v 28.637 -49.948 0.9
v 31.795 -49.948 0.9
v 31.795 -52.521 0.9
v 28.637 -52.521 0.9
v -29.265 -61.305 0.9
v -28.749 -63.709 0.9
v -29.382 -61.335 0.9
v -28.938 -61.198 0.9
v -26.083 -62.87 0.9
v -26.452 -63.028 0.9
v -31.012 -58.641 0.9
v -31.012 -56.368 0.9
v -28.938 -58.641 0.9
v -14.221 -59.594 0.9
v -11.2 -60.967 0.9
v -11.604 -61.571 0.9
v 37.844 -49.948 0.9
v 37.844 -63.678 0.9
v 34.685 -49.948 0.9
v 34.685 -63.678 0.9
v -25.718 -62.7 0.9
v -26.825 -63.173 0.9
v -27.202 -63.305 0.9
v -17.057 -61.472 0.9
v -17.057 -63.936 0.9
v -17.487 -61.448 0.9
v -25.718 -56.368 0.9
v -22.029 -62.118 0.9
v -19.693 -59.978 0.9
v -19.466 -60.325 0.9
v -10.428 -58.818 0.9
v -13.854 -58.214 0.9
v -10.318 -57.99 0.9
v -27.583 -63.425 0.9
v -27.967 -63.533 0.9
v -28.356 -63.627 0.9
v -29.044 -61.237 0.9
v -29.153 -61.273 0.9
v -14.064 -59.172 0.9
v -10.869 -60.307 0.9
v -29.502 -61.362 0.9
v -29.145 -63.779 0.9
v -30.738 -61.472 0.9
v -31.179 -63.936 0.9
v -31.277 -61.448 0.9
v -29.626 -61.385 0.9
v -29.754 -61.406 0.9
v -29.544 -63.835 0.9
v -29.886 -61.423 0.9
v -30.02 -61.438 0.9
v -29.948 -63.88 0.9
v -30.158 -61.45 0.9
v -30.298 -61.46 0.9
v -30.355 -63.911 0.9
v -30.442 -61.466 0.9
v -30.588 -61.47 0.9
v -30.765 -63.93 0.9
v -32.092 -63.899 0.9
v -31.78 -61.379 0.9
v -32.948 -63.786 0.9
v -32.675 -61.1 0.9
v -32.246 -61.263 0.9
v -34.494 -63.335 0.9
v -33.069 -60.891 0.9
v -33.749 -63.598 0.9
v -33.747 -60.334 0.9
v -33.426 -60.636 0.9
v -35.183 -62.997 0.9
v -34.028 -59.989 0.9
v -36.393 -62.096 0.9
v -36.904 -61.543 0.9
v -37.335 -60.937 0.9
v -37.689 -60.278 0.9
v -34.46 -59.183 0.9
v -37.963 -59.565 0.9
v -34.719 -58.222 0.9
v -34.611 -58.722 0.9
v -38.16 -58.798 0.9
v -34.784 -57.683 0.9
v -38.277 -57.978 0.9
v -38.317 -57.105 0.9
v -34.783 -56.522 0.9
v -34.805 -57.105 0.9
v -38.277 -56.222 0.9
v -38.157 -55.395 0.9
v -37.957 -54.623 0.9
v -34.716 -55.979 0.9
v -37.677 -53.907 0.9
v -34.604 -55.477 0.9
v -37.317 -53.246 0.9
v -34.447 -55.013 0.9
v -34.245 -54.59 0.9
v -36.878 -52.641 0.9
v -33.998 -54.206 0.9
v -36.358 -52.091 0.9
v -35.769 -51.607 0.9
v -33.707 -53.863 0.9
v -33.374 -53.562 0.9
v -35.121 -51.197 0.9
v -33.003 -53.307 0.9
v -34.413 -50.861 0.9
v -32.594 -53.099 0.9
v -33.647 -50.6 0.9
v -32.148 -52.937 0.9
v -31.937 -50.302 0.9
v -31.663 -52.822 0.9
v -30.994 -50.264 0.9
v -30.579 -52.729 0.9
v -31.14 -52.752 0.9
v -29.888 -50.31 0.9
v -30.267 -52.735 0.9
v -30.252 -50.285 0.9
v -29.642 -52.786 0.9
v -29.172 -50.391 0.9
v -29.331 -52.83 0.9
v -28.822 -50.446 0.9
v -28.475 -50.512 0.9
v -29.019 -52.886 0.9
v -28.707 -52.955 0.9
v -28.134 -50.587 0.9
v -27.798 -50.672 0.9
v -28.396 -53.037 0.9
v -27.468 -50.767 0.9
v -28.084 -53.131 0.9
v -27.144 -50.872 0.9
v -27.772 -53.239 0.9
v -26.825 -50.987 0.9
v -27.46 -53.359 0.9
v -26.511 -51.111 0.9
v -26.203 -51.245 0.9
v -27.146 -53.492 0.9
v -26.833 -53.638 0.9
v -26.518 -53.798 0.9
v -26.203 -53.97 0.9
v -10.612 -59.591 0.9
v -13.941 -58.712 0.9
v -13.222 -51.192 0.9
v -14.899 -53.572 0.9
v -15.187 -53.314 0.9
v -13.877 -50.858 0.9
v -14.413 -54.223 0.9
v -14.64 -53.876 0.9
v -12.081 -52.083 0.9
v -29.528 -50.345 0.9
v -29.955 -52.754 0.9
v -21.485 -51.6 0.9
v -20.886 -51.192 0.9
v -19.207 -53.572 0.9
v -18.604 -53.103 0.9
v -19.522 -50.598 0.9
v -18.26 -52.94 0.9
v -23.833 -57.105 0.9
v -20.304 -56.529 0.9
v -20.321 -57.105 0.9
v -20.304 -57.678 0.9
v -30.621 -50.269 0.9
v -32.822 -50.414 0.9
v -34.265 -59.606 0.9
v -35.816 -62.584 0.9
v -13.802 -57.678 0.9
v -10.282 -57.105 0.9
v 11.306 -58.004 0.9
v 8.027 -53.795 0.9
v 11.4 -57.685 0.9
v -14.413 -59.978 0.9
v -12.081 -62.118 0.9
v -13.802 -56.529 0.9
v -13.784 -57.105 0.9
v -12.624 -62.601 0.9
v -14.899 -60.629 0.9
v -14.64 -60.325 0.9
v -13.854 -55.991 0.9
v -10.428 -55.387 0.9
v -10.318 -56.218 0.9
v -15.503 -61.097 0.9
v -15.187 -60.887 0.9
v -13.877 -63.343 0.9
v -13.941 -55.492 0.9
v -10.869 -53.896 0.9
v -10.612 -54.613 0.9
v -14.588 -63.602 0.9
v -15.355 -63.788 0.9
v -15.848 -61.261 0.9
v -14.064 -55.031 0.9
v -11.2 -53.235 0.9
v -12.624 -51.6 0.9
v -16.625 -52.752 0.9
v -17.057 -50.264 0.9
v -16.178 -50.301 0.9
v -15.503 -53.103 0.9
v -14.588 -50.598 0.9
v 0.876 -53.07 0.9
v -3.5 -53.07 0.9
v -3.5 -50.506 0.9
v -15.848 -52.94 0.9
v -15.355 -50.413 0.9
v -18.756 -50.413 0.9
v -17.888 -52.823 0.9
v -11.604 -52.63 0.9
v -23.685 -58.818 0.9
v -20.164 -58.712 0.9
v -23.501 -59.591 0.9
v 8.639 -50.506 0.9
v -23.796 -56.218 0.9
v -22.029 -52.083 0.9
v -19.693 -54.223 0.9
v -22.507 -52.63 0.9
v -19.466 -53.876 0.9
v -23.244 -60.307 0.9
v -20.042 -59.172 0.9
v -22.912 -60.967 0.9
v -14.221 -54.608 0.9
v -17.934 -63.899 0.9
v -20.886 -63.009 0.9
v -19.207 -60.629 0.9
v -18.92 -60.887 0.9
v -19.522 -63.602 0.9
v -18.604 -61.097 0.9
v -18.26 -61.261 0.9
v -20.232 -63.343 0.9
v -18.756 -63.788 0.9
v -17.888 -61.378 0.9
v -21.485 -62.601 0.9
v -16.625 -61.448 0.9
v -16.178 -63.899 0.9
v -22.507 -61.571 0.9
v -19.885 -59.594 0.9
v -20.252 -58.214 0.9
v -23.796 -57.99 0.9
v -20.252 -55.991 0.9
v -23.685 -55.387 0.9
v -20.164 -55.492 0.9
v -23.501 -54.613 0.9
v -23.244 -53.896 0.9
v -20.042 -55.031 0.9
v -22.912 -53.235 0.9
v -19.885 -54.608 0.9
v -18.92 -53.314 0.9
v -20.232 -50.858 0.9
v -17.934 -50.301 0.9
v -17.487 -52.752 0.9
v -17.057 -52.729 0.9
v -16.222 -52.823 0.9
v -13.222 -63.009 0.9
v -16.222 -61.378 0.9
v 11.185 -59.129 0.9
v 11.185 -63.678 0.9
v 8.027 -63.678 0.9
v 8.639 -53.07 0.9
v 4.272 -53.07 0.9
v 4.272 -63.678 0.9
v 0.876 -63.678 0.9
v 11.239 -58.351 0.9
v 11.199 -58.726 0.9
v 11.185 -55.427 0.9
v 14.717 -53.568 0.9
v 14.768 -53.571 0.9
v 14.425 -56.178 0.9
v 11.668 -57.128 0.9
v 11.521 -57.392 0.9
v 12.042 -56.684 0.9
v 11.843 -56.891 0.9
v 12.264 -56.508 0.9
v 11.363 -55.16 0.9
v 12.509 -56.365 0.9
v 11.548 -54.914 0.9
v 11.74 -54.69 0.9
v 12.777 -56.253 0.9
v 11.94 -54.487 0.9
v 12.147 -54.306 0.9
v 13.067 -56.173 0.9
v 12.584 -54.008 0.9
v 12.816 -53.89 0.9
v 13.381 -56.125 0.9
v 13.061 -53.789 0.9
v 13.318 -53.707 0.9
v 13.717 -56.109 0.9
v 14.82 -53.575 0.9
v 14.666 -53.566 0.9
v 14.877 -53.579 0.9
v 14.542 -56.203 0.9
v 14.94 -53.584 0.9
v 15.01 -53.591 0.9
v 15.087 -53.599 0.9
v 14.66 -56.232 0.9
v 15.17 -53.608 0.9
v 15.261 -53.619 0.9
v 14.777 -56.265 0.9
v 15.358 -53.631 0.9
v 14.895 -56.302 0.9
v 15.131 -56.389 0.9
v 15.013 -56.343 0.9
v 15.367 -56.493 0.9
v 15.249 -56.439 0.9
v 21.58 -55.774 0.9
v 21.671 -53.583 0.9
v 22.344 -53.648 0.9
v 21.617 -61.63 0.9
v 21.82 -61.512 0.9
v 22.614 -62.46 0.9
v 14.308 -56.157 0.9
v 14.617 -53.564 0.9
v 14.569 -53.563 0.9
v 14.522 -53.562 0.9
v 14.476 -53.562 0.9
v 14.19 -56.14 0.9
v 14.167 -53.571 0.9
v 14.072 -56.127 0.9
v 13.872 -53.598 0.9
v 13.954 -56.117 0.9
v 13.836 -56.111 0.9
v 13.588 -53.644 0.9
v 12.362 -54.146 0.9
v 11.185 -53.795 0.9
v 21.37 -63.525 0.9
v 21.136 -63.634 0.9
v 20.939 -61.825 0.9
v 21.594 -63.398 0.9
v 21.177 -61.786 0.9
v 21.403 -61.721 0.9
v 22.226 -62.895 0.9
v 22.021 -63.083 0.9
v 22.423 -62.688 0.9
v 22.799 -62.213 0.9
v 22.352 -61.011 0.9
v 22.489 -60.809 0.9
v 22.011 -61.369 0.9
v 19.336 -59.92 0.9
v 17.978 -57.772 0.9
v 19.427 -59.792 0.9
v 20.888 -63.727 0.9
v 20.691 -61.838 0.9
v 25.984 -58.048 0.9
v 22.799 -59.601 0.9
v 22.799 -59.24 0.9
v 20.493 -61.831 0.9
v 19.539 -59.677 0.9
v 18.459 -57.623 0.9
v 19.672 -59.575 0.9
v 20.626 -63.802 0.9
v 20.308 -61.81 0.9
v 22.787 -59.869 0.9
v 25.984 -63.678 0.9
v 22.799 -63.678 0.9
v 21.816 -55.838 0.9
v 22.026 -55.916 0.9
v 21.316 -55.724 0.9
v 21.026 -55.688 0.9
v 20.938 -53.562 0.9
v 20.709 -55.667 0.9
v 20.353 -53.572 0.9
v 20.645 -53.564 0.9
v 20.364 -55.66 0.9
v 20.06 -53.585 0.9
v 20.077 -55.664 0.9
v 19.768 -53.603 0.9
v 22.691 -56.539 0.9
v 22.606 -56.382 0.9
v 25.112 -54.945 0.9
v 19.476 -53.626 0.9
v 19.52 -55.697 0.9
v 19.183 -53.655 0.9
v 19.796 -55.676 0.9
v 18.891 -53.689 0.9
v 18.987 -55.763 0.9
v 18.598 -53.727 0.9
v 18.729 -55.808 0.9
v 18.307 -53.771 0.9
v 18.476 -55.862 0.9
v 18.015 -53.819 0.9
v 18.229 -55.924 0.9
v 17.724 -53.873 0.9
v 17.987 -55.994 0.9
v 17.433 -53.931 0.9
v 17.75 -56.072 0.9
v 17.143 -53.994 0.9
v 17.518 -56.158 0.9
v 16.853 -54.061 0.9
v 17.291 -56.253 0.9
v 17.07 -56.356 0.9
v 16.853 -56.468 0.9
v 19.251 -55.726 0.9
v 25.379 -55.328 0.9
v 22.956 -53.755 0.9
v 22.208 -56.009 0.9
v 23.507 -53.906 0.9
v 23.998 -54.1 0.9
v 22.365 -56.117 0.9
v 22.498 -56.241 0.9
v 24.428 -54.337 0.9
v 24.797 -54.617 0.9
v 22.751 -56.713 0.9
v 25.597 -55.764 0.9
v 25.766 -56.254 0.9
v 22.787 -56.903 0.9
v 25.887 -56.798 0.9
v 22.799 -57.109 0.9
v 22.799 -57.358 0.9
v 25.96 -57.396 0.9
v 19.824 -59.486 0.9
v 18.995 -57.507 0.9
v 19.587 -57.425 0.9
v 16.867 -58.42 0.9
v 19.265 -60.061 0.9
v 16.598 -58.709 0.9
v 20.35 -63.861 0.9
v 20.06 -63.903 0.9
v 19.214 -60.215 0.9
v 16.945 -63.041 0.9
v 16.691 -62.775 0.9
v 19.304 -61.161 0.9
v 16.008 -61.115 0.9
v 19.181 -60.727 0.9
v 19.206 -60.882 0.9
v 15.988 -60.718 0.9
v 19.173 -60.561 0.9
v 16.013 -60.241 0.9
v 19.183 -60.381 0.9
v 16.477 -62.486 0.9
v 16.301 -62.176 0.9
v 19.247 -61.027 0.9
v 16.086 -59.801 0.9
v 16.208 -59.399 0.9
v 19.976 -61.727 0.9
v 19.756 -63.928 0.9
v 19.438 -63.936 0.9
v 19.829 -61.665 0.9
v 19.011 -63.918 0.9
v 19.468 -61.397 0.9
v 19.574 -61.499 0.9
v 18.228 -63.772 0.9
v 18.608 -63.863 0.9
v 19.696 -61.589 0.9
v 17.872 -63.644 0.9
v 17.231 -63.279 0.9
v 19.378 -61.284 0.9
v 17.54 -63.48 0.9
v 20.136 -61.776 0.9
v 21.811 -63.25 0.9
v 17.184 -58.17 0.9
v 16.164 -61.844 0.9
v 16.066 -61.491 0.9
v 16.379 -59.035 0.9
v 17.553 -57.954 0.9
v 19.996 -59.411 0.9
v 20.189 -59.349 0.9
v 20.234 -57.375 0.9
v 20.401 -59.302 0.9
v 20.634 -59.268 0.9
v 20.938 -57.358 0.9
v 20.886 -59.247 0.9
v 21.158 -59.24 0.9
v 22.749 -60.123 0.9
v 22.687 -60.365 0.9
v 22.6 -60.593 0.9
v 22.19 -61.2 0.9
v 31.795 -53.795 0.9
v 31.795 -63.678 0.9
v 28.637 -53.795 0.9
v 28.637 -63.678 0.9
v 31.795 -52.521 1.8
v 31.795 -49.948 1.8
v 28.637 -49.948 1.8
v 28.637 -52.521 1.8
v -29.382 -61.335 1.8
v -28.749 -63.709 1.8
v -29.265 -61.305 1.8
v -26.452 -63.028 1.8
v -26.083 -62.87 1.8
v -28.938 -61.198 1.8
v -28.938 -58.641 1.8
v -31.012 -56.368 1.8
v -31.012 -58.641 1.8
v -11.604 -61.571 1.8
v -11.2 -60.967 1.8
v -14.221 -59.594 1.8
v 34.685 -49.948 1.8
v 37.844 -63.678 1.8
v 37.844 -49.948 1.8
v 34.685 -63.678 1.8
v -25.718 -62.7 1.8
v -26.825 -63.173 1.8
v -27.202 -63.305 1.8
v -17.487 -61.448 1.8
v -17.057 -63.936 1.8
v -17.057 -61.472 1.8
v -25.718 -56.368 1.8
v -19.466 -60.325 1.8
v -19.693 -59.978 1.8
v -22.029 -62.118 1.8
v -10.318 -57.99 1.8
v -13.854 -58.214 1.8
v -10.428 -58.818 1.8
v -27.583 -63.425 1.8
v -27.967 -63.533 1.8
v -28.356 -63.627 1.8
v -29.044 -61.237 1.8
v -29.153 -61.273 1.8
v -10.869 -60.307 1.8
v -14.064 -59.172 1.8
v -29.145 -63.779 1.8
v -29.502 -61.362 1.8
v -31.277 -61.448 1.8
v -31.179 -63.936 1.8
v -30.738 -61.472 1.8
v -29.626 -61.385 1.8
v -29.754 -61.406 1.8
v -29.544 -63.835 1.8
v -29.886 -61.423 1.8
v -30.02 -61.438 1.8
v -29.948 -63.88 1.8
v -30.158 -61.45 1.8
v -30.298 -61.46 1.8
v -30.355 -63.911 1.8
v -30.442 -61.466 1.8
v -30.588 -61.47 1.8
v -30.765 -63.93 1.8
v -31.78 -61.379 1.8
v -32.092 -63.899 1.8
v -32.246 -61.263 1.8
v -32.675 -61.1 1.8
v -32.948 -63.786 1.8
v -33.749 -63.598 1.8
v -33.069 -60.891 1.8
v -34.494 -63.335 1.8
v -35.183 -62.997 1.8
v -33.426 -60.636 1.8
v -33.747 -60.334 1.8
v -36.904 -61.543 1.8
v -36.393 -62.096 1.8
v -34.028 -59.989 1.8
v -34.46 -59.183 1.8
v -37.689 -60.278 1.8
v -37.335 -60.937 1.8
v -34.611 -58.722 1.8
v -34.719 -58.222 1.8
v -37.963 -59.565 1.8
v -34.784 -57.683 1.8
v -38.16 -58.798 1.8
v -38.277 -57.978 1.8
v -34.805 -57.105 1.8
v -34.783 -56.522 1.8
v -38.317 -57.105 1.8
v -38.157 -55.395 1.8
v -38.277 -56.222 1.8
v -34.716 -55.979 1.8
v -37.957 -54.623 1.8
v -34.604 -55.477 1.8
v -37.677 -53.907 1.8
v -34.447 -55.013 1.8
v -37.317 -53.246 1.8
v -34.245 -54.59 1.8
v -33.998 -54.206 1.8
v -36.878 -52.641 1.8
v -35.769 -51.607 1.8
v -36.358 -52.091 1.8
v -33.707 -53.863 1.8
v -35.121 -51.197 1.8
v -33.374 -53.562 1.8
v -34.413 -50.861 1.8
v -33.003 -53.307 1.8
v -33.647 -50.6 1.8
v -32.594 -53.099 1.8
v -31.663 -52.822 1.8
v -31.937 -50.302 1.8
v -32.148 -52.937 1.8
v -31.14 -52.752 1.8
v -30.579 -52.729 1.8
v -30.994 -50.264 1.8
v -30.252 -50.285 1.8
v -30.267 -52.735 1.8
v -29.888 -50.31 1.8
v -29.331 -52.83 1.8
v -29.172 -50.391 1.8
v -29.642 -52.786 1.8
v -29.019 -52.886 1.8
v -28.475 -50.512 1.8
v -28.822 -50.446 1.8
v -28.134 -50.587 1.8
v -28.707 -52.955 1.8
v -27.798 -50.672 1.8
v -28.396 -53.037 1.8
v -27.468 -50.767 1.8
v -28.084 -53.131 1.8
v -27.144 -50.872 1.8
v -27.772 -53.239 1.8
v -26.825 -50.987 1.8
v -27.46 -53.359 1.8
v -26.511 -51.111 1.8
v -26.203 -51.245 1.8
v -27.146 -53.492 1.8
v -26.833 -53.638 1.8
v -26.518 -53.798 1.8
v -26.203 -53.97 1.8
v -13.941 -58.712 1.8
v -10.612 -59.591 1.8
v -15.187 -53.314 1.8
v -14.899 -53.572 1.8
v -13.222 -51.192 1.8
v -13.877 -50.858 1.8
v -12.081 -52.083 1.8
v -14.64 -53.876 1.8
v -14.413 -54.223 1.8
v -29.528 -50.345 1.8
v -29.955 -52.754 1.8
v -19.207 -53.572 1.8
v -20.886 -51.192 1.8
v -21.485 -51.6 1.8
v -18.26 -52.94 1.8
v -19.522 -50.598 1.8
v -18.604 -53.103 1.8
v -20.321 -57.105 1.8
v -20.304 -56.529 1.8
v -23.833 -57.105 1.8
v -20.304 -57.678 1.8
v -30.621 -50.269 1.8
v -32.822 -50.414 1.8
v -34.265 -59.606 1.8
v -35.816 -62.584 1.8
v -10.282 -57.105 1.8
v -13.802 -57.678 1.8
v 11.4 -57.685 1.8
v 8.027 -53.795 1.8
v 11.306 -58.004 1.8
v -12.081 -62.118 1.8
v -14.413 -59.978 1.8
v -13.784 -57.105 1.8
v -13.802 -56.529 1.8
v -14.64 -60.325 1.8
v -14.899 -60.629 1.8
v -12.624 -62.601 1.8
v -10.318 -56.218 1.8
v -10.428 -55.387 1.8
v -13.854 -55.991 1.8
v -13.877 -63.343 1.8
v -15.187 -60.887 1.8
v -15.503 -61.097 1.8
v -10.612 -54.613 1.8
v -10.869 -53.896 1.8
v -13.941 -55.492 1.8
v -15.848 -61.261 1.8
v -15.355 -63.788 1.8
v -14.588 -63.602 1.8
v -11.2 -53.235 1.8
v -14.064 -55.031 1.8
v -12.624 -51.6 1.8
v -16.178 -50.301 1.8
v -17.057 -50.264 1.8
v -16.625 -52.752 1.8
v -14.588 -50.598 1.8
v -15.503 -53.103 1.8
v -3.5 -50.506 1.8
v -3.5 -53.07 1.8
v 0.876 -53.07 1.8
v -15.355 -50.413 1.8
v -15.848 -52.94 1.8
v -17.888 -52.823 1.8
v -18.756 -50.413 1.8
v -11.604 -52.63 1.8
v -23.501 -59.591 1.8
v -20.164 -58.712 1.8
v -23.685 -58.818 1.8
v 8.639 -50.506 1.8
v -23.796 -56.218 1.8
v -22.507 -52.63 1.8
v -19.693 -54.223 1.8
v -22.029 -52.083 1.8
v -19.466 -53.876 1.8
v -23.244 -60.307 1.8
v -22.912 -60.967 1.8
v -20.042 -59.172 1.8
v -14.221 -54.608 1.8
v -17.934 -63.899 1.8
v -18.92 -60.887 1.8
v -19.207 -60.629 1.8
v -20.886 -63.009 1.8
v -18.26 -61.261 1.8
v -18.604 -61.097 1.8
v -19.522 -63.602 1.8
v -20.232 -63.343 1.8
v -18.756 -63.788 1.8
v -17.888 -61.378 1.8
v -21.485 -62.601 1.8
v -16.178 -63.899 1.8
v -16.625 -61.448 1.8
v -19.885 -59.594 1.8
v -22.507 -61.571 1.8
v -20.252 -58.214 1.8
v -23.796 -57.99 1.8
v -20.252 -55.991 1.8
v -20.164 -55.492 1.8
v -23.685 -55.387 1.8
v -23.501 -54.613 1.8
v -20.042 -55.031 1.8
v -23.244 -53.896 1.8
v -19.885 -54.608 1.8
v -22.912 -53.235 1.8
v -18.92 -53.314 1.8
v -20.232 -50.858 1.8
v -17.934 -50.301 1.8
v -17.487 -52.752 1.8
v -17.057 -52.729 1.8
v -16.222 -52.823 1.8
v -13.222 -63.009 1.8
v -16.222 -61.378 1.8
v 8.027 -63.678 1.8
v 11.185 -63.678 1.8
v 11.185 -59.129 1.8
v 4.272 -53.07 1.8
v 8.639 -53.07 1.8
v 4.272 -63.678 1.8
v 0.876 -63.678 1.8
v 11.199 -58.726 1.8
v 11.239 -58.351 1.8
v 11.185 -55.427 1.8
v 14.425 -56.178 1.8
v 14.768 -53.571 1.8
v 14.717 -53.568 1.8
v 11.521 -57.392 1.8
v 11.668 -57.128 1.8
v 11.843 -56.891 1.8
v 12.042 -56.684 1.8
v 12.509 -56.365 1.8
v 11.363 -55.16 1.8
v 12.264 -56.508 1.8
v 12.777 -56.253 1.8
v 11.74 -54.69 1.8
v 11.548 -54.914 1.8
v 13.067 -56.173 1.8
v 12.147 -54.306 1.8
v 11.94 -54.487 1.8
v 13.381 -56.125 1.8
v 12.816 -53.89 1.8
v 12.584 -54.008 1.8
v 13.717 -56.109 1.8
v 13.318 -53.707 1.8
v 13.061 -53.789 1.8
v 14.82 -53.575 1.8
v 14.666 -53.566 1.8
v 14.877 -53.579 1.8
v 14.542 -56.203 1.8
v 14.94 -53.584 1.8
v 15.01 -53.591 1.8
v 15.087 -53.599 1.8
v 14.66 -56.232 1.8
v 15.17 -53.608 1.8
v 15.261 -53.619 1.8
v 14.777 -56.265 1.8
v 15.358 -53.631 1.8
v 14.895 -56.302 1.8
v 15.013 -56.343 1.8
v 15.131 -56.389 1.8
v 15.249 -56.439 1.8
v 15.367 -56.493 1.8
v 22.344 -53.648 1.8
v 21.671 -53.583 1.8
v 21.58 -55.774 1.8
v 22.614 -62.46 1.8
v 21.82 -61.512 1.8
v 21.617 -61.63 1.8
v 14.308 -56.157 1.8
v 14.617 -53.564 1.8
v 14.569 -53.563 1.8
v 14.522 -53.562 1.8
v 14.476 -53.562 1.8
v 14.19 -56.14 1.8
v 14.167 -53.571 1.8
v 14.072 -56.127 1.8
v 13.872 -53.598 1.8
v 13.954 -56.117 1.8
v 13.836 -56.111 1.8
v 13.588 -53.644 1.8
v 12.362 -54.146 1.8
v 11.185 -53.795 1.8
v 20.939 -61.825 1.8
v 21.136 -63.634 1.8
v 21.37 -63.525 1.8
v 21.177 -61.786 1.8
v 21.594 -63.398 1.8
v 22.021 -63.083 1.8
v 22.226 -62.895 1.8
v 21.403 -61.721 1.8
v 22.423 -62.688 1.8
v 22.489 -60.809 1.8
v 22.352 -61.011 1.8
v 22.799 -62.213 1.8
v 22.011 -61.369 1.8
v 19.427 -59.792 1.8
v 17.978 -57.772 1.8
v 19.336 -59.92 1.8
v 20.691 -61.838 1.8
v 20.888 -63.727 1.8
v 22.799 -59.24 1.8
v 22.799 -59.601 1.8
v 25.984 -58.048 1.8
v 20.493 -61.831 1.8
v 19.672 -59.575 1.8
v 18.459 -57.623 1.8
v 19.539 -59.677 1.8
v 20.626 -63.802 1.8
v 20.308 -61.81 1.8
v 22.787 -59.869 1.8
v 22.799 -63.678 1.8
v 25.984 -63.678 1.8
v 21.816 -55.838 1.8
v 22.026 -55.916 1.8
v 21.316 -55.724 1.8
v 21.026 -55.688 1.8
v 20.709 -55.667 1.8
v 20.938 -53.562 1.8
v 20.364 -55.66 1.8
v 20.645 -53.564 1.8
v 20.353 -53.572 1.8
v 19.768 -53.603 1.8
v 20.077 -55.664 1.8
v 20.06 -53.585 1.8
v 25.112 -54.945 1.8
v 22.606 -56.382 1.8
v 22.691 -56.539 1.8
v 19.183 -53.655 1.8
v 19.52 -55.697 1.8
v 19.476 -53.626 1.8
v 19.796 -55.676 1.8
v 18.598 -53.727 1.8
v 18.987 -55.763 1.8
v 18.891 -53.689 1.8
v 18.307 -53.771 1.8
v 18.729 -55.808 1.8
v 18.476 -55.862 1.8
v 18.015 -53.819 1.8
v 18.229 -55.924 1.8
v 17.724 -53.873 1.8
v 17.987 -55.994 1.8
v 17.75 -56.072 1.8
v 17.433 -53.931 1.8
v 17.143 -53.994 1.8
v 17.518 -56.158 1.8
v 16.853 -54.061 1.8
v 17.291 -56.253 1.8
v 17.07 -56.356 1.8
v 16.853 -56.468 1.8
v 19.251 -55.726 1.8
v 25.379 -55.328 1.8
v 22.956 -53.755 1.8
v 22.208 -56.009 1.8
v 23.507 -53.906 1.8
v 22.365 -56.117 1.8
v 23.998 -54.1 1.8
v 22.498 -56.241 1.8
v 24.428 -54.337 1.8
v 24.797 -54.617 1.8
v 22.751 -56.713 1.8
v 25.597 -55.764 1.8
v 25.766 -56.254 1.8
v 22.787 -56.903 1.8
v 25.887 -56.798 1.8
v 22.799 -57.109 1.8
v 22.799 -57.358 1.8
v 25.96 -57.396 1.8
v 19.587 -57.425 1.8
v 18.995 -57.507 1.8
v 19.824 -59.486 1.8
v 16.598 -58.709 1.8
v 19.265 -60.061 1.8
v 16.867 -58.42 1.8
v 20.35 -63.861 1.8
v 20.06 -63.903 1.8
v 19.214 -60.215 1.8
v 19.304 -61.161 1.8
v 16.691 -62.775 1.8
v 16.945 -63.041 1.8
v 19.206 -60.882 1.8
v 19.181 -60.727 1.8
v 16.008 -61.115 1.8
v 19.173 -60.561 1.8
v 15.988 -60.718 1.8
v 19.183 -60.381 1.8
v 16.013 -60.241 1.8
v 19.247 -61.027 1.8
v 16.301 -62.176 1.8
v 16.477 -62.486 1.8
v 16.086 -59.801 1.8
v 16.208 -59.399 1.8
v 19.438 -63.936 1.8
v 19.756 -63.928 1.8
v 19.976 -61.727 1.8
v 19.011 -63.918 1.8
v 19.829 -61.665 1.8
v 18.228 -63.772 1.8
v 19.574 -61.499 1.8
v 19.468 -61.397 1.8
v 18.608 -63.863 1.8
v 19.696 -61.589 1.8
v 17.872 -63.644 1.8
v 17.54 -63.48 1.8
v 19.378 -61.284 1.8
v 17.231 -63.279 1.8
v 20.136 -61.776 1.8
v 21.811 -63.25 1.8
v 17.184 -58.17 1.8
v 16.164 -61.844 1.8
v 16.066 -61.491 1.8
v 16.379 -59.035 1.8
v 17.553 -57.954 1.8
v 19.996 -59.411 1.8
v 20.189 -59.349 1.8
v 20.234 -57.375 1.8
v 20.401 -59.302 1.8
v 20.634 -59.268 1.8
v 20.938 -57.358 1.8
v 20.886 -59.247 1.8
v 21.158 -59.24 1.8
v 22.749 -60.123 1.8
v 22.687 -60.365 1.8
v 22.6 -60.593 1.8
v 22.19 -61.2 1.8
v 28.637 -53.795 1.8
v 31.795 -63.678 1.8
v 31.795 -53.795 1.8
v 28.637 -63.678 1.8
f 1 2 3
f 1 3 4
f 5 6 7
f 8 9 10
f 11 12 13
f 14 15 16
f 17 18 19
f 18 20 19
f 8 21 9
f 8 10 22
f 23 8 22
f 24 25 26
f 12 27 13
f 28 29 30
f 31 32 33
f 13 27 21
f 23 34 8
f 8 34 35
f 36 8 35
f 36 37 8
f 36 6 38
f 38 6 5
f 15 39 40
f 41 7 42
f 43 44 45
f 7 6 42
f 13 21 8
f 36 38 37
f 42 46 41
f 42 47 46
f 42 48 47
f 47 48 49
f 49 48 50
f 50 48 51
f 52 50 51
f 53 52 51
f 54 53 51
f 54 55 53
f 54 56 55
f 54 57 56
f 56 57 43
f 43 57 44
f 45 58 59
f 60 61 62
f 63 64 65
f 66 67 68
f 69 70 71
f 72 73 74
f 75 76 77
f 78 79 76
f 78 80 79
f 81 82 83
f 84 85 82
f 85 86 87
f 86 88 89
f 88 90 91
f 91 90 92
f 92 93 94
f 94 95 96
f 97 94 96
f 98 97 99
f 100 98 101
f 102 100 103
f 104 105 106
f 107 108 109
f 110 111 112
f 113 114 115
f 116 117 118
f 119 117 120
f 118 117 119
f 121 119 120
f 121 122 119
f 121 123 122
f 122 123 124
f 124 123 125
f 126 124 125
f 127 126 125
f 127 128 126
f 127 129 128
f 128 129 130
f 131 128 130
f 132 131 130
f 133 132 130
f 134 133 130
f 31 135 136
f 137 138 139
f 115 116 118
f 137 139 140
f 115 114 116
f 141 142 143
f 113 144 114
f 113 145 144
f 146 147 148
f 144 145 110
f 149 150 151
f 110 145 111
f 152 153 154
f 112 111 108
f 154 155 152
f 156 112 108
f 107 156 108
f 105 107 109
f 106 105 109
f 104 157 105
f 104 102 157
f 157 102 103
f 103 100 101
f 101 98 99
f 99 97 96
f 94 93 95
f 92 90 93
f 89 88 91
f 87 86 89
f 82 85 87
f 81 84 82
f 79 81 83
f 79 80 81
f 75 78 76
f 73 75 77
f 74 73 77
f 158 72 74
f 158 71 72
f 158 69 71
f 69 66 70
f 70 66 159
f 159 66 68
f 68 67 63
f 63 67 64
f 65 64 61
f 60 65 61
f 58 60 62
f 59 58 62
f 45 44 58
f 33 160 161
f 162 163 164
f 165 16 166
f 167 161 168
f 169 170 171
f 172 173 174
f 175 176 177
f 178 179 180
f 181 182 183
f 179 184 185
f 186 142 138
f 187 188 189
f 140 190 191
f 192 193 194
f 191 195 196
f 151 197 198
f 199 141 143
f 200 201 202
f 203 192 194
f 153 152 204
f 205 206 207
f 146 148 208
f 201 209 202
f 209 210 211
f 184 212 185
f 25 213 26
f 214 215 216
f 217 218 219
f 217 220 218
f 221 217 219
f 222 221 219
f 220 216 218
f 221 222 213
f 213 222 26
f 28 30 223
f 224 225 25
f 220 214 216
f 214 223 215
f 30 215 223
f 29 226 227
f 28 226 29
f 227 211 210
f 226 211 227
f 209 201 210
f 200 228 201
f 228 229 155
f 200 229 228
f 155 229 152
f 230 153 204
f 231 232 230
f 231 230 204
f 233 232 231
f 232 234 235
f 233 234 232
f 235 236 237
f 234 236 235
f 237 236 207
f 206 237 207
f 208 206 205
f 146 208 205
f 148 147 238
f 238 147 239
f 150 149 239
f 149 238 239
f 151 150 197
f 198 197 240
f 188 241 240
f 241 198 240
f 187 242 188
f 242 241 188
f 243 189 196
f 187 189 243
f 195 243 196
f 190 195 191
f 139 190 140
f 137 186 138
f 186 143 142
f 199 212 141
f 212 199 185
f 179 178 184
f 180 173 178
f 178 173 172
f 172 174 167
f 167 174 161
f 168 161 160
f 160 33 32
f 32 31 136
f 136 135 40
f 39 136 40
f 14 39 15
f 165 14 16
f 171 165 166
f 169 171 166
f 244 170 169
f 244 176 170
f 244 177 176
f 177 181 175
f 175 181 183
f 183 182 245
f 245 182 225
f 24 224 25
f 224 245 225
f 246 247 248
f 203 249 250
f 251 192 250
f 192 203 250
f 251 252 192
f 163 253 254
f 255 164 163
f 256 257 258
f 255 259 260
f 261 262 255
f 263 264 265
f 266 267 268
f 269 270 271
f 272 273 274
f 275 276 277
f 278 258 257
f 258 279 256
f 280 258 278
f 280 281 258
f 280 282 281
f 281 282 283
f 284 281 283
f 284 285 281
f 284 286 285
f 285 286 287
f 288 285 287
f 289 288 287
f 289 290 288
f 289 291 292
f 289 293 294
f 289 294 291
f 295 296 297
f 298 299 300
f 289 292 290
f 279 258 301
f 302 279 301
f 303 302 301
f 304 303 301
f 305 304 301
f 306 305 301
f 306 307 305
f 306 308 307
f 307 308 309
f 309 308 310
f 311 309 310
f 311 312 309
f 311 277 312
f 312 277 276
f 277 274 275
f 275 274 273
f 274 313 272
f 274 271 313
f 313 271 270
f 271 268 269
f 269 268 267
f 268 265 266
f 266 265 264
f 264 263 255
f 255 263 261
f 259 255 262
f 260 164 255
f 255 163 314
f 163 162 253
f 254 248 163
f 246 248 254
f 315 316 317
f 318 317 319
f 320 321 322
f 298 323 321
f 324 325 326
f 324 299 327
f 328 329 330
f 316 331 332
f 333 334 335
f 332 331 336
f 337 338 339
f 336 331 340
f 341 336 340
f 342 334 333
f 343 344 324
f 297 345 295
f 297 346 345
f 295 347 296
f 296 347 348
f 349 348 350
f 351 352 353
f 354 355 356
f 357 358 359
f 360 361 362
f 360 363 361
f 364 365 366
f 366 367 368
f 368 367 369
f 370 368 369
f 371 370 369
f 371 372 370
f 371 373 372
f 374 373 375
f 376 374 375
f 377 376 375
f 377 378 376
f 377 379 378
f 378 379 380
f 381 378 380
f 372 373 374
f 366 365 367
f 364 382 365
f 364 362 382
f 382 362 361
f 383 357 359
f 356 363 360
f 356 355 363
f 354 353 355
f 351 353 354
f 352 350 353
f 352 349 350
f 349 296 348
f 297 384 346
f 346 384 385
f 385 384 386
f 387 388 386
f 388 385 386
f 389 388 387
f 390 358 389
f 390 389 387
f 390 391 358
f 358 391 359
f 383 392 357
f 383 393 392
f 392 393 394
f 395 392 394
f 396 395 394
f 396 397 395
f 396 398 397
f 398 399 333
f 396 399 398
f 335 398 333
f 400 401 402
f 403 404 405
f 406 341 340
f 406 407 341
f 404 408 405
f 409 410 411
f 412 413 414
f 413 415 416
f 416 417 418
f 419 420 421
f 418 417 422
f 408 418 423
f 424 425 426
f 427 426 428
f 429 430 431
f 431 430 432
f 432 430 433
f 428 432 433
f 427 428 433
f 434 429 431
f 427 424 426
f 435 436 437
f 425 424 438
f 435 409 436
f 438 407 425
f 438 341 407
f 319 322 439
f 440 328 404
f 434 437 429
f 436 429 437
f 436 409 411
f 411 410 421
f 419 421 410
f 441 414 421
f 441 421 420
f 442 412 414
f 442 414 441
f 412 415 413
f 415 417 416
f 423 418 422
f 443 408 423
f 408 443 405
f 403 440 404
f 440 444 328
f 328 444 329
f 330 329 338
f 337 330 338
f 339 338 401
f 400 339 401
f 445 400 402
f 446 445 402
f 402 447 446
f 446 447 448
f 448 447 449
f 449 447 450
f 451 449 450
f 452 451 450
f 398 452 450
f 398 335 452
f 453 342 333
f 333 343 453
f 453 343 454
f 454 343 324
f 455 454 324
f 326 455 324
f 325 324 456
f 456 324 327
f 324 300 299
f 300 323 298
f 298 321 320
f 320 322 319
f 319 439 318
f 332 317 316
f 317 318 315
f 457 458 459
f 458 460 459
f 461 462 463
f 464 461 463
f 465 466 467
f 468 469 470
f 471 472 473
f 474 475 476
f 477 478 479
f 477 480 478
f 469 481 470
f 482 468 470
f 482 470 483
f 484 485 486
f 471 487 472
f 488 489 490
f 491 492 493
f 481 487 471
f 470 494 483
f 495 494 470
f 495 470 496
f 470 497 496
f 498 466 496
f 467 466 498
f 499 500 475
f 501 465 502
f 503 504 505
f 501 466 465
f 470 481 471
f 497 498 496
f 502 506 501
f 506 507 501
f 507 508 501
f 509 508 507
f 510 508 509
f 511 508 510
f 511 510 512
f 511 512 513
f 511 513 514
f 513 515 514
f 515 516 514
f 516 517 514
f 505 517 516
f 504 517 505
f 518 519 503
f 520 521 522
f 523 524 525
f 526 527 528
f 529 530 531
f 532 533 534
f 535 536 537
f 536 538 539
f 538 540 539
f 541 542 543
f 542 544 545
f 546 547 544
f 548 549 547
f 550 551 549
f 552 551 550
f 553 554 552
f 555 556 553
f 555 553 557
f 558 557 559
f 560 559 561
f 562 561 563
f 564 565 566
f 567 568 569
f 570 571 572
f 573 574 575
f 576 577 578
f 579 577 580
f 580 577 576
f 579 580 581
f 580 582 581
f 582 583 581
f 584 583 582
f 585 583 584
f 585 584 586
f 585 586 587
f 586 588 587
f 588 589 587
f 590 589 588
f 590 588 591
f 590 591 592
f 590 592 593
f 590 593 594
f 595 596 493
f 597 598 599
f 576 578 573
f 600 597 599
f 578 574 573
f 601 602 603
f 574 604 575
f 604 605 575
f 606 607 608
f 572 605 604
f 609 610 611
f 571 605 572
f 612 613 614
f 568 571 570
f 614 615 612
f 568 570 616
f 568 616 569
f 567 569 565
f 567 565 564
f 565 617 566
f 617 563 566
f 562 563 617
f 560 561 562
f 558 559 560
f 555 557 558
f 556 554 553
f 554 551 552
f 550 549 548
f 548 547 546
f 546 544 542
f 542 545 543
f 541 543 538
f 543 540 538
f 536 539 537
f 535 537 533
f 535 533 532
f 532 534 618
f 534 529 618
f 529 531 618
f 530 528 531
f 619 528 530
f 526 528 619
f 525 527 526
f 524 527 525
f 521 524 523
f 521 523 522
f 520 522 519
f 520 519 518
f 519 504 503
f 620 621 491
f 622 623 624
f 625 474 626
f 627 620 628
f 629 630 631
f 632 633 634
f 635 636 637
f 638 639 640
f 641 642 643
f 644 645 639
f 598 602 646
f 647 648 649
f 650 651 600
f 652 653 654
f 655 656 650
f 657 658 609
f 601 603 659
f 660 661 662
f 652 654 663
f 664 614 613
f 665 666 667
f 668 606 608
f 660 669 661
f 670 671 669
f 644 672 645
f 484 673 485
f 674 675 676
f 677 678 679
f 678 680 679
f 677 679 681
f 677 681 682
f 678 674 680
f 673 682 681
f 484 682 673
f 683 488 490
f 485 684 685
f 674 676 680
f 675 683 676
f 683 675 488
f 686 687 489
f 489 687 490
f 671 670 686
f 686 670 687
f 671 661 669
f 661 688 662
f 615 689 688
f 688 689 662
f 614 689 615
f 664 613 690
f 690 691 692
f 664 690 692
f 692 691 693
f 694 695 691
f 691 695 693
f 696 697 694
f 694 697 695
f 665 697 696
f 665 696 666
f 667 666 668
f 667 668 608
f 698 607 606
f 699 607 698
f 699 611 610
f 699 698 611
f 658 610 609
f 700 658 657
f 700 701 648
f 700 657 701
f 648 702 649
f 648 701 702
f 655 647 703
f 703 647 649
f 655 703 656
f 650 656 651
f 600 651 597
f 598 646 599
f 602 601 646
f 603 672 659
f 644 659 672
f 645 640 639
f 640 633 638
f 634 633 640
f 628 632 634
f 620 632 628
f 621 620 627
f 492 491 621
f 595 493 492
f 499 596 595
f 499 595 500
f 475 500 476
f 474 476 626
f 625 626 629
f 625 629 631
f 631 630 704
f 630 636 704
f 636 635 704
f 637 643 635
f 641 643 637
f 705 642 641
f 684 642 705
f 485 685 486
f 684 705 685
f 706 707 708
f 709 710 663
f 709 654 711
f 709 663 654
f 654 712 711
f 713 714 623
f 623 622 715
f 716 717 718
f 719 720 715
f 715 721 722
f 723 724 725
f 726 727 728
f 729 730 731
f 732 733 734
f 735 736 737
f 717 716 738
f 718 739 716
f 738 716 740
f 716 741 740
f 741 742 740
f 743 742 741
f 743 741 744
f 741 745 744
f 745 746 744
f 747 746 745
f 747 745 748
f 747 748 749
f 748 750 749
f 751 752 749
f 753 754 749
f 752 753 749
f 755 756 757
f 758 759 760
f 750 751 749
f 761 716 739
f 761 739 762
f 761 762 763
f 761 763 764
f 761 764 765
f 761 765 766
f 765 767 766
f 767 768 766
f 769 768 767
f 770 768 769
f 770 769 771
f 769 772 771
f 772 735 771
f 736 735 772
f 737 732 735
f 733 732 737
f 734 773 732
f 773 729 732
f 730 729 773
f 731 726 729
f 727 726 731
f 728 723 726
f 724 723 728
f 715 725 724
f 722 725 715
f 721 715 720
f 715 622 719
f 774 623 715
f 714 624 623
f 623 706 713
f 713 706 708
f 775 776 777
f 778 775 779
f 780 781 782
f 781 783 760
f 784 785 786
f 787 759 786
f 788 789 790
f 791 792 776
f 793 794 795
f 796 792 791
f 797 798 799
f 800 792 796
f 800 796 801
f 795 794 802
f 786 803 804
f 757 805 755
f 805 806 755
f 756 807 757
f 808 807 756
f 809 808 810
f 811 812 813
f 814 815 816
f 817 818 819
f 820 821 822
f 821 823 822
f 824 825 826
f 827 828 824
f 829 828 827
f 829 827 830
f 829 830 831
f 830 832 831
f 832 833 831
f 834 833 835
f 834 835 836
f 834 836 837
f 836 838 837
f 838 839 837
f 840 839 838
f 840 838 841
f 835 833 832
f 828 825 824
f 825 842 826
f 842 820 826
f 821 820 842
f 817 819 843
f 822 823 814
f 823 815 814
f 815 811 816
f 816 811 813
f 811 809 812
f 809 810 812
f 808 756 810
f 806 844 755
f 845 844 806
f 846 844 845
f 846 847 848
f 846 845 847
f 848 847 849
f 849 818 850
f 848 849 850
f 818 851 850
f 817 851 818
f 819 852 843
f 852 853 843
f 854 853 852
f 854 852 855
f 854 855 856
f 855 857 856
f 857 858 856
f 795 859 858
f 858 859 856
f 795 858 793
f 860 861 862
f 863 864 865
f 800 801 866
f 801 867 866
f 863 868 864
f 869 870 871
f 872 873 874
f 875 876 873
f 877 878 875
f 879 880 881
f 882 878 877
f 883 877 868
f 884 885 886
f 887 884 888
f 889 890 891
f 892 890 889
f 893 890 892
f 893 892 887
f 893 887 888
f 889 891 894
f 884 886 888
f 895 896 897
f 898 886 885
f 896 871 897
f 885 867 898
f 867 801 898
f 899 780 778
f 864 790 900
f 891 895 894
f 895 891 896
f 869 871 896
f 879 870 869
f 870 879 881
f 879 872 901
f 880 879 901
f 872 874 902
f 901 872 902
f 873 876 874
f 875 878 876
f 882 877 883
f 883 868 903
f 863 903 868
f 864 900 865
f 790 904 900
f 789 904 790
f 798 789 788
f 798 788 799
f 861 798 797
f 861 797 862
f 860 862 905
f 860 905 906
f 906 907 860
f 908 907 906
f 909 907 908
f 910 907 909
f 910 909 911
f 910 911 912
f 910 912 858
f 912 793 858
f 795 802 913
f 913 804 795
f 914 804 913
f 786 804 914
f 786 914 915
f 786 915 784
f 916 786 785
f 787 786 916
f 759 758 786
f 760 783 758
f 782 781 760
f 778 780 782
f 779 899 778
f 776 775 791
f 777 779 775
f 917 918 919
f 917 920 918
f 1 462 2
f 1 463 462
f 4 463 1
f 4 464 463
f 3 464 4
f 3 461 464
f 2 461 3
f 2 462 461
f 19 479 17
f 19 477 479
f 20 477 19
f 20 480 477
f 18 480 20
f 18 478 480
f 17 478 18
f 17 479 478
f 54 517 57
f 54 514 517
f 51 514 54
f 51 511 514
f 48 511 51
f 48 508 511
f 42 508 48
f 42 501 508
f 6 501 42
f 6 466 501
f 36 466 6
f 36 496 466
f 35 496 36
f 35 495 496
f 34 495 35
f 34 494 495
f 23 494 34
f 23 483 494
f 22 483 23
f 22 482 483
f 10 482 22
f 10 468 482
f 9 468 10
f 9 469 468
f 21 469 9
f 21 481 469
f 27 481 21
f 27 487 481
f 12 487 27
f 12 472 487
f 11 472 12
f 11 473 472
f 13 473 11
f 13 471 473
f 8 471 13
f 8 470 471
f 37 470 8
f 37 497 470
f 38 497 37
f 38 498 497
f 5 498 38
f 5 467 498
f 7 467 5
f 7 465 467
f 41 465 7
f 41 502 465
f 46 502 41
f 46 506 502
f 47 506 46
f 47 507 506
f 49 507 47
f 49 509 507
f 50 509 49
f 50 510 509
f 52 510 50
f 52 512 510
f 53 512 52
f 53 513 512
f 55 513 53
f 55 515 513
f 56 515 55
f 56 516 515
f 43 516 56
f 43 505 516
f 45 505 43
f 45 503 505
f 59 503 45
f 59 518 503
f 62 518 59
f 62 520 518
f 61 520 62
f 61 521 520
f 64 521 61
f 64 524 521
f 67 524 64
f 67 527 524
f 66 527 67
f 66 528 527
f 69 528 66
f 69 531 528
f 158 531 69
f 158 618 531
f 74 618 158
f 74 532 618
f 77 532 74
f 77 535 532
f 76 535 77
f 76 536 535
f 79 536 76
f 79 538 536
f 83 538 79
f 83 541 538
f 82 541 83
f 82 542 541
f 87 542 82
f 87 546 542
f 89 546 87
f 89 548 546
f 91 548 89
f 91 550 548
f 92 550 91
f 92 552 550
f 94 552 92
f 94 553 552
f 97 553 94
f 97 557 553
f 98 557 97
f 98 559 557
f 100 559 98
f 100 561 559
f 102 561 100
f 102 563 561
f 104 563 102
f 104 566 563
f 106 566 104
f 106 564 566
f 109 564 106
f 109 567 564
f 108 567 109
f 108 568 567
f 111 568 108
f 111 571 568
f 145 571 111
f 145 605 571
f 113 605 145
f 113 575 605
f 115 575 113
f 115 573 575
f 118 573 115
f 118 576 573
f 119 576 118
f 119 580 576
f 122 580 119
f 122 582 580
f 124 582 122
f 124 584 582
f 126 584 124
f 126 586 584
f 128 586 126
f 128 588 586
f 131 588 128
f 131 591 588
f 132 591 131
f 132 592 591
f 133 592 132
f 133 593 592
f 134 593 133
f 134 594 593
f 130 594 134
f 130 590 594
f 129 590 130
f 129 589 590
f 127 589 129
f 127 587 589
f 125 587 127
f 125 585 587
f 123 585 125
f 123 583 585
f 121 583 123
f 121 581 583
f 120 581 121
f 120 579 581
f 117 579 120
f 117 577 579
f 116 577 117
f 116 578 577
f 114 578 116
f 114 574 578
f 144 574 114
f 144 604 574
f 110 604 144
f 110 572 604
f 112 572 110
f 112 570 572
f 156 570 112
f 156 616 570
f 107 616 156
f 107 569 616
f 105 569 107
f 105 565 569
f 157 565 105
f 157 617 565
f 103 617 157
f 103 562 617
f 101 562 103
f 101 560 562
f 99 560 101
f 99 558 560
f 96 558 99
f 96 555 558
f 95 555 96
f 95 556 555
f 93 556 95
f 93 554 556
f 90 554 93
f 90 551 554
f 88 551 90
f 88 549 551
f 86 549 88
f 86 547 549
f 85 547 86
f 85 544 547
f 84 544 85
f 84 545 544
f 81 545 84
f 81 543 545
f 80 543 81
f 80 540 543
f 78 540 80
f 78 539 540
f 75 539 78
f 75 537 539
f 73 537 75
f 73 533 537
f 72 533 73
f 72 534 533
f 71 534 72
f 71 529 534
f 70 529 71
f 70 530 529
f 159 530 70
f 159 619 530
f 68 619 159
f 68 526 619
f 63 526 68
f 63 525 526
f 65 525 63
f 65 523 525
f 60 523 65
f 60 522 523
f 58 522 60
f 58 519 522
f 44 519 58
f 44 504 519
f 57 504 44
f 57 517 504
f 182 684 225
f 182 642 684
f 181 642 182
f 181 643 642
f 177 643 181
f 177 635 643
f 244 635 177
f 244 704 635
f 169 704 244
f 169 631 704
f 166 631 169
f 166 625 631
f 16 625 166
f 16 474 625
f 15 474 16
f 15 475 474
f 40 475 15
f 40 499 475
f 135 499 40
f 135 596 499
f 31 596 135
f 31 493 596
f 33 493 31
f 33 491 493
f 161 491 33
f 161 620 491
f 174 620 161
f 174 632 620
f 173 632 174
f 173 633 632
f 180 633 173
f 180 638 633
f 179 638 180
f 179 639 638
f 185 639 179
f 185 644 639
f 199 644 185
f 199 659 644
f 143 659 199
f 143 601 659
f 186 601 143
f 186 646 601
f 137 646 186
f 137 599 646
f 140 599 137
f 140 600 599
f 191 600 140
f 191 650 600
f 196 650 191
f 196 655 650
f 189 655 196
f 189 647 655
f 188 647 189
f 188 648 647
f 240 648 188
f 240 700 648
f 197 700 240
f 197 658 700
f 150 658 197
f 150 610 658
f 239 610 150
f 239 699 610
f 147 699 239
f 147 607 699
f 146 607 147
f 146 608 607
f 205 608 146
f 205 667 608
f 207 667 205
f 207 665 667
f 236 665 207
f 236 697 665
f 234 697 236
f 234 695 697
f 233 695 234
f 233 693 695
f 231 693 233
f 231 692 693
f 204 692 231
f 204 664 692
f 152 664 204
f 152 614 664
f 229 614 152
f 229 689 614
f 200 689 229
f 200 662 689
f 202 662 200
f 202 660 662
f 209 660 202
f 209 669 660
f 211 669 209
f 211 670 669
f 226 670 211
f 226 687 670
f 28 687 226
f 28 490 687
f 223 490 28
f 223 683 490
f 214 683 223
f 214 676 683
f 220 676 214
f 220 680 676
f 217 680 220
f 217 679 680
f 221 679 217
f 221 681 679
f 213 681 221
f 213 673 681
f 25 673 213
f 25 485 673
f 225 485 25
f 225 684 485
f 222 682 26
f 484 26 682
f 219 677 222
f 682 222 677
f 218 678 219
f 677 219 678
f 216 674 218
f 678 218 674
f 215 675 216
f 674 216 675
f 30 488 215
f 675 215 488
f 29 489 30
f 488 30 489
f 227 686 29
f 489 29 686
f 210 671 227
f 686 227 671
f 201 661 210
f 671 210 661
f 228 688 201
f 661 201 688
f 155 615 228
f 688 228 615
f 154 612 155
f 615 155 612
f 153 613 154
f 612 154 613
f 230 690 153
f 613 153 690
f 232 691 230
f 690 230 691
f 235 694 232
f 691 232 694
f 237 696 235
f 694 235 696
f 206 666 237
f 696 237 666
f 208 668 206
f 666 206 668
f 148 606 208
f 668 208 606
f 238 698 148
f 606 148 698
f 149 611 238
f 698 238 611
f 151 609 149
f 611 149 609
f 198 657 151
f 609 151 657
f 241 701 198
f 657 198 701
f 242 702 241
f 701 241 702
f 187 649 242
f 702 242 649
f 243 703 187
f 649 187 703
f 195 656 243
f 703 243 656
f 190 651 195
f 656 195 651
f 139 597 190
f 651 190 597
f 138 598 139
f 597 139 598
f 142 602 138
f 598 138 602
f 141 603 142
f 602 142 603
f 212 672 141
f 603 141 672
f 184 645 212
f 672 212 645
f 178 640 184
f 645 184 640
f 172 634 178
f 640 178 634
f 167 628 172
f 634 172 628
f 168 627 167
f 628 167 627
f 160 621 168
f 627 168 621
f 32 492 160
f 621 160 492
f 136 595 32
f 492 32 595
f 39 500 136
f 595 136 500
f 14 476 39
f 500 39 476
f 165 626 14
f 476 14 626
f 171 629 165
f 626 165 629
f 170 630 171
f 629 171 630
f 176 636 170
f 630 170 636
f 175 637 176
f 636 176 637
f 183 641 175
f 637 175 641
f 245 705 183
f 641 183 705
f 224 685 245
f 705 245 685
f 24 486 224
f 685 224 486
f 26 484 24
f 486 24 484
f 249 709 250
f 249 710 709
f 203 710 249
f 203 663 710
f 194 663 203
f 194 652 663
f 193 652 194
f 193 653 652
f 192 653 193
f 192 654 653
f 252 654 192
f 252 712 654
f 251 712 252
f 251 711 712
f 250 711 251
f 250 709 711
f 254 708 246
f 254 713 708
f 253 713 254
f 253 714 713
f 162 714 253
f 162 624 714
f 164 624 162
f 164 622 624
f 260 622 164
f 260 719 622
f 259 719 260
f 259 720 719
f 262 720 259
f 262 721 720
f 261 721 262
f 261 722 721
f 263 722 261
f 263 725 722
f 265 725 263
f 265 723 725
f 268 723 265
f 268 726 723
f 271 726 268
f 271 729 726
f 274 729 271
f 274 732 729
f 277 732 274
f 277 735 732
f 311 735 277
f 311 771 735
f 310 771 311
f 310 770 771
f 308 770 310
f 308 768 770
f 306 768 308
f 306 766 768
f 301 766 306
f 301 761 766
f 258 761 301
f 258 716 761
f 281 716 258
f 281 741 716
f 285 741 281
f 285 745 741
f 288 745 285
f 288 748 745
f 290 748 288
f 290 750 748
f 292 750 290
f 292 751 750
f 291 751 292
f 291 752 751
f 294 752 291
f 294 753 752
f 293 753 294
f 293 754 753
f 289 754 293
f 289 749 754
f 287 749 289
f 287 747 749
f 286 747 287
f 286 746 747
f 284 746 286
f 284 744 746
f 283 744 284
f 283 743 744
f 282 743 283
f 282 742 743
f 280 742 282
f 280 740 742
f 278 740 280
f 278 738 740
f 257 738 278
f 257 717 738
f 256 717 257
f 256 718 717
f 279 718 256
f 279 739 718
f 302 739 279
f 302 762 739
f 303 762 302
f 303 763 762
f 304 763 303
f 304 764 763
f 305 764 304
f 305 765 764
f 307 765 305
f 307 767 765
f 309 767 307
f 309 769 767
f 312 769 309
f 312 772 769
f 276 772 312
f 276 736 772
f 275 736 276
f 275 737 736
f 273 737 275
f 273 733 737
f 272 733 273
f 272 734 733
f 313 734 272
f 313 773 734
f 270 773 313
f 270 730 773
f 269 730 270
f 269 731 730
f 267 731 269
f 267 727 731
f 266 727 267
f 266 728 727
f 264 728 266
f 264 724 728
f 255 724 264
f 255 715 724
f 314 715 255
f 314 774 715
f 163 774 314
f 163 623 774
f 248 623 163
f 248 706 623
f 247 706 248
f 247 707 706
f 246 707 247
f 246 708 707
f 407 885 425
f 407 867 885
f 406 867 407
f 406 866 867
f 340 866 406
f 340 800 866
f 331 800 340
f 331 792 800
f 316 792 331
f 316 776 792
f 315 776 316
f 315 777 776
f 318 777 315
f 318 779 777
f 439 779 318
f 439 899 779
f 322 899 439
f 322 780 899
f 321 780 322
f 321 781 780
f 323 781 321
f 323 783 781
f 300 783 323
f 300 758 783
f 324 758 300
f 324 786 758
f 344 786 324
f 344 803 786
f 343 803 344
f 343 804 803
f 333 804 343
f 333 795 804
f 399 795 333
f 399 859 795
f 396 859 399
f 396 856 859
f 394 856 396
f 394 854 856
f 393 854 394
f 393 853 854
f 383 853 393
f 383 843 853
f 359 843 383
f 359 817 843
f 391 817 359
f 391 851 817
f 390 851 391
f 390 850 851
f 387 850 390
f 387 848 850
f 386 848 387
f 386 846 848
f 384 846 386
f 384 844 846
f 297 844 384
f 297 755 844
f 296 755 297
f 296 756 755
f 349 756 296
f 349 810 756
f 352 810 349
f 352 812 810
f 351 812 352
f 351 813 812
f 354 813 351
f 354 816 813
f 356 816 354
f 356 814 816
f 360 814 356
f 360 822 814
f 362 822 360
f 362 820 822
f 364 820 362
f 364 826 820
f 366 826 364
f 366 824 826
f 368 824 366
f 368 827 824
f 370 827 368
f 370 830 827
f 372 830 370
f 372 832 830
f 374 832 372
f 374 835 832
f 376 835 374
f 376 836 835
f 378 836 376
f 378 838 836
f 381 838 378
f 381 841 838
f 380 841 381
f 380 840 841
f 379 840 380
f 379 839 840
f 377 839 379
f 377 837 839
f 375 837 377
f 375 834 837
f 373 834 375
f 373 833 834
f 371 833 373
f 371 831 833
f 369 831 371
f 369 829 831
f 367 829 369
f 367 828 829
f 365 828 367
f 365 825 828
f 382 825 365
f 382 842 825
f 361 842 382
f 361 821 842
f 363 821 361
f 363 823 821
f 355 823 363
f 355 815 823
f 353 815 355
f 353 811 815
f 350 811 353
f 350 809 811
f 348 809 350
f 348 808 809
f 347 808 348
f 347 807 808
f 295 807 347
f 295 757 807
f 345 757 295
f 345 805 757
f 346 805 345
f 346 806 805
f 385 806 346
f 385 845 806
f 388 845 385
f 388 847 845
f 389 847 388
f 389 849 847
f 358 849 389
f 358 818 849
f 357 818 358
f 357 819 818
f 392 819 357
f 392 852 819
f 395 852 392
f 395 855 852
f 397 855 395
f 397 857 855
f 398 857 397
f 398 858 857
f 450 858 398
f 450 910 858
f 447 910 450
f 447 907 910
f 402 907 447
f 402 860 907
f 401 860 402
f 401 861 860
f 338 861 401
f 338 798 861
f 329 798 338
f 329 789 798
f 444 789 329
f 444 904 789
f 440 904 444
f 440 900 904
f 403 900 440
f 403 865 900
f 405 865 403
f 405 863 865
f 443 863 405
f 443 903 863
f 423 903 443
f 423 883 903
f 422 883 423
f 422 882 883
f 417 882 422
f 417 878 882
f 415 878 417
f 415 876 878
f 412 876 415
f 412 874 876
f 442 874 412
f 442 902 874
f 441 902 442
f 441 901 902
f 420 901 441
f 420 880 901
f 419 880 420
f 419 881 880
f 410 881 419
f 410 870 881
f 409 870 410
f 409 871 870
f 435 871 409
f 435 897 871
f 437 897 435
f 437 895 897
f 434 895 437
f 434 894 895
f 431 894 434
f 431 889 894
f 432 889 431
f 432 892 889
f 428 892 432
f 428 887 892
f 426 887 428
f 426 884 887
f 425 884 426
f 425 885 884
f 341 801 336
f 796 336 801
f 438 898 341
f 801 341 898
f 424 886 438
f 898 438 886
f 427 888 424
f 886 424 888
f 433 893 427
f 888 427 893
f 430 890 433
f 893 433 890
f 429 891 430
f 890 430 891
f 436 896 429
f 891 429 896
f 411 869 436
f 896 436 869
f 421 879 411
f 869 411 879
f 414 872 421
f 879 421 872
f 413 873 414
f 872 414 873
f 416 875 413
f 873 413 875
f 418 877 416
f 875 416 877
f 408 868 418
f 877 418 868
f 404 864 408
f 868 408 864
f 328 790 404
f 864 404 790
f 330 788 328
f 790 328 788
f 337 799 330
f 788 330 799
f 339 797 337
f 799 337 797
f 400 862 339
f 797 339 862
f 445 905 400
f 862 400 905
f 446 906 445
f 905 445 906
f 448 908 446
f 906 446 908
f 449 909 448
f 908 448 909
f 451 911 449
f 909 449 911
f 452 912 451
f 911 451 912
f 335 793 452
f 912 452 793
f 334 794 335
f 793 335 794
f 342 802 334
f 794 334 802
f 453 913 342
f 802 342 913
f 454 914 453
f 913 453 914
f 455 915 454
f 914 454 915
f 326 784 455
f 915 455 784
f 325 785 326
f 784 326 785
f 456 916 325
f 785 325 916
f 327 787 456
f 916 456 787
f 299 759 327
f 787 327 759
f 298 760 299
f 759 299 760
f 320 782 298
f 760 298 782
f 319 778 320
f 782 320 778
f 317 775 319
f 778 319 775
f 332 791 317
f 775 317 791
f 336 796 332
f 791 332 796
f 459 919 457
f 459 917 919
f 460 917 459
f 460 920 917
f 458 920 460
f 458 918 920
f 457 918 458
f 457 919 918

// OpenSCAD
$fn = 48;
  // English (below bottom hole)
  translate([0, -57.100, 0.900]) linear_extrude(height=0.900) text("GO Trail", size=13.010, halign="center", valign="center", font="Helvetica Neue:style=Bold");
